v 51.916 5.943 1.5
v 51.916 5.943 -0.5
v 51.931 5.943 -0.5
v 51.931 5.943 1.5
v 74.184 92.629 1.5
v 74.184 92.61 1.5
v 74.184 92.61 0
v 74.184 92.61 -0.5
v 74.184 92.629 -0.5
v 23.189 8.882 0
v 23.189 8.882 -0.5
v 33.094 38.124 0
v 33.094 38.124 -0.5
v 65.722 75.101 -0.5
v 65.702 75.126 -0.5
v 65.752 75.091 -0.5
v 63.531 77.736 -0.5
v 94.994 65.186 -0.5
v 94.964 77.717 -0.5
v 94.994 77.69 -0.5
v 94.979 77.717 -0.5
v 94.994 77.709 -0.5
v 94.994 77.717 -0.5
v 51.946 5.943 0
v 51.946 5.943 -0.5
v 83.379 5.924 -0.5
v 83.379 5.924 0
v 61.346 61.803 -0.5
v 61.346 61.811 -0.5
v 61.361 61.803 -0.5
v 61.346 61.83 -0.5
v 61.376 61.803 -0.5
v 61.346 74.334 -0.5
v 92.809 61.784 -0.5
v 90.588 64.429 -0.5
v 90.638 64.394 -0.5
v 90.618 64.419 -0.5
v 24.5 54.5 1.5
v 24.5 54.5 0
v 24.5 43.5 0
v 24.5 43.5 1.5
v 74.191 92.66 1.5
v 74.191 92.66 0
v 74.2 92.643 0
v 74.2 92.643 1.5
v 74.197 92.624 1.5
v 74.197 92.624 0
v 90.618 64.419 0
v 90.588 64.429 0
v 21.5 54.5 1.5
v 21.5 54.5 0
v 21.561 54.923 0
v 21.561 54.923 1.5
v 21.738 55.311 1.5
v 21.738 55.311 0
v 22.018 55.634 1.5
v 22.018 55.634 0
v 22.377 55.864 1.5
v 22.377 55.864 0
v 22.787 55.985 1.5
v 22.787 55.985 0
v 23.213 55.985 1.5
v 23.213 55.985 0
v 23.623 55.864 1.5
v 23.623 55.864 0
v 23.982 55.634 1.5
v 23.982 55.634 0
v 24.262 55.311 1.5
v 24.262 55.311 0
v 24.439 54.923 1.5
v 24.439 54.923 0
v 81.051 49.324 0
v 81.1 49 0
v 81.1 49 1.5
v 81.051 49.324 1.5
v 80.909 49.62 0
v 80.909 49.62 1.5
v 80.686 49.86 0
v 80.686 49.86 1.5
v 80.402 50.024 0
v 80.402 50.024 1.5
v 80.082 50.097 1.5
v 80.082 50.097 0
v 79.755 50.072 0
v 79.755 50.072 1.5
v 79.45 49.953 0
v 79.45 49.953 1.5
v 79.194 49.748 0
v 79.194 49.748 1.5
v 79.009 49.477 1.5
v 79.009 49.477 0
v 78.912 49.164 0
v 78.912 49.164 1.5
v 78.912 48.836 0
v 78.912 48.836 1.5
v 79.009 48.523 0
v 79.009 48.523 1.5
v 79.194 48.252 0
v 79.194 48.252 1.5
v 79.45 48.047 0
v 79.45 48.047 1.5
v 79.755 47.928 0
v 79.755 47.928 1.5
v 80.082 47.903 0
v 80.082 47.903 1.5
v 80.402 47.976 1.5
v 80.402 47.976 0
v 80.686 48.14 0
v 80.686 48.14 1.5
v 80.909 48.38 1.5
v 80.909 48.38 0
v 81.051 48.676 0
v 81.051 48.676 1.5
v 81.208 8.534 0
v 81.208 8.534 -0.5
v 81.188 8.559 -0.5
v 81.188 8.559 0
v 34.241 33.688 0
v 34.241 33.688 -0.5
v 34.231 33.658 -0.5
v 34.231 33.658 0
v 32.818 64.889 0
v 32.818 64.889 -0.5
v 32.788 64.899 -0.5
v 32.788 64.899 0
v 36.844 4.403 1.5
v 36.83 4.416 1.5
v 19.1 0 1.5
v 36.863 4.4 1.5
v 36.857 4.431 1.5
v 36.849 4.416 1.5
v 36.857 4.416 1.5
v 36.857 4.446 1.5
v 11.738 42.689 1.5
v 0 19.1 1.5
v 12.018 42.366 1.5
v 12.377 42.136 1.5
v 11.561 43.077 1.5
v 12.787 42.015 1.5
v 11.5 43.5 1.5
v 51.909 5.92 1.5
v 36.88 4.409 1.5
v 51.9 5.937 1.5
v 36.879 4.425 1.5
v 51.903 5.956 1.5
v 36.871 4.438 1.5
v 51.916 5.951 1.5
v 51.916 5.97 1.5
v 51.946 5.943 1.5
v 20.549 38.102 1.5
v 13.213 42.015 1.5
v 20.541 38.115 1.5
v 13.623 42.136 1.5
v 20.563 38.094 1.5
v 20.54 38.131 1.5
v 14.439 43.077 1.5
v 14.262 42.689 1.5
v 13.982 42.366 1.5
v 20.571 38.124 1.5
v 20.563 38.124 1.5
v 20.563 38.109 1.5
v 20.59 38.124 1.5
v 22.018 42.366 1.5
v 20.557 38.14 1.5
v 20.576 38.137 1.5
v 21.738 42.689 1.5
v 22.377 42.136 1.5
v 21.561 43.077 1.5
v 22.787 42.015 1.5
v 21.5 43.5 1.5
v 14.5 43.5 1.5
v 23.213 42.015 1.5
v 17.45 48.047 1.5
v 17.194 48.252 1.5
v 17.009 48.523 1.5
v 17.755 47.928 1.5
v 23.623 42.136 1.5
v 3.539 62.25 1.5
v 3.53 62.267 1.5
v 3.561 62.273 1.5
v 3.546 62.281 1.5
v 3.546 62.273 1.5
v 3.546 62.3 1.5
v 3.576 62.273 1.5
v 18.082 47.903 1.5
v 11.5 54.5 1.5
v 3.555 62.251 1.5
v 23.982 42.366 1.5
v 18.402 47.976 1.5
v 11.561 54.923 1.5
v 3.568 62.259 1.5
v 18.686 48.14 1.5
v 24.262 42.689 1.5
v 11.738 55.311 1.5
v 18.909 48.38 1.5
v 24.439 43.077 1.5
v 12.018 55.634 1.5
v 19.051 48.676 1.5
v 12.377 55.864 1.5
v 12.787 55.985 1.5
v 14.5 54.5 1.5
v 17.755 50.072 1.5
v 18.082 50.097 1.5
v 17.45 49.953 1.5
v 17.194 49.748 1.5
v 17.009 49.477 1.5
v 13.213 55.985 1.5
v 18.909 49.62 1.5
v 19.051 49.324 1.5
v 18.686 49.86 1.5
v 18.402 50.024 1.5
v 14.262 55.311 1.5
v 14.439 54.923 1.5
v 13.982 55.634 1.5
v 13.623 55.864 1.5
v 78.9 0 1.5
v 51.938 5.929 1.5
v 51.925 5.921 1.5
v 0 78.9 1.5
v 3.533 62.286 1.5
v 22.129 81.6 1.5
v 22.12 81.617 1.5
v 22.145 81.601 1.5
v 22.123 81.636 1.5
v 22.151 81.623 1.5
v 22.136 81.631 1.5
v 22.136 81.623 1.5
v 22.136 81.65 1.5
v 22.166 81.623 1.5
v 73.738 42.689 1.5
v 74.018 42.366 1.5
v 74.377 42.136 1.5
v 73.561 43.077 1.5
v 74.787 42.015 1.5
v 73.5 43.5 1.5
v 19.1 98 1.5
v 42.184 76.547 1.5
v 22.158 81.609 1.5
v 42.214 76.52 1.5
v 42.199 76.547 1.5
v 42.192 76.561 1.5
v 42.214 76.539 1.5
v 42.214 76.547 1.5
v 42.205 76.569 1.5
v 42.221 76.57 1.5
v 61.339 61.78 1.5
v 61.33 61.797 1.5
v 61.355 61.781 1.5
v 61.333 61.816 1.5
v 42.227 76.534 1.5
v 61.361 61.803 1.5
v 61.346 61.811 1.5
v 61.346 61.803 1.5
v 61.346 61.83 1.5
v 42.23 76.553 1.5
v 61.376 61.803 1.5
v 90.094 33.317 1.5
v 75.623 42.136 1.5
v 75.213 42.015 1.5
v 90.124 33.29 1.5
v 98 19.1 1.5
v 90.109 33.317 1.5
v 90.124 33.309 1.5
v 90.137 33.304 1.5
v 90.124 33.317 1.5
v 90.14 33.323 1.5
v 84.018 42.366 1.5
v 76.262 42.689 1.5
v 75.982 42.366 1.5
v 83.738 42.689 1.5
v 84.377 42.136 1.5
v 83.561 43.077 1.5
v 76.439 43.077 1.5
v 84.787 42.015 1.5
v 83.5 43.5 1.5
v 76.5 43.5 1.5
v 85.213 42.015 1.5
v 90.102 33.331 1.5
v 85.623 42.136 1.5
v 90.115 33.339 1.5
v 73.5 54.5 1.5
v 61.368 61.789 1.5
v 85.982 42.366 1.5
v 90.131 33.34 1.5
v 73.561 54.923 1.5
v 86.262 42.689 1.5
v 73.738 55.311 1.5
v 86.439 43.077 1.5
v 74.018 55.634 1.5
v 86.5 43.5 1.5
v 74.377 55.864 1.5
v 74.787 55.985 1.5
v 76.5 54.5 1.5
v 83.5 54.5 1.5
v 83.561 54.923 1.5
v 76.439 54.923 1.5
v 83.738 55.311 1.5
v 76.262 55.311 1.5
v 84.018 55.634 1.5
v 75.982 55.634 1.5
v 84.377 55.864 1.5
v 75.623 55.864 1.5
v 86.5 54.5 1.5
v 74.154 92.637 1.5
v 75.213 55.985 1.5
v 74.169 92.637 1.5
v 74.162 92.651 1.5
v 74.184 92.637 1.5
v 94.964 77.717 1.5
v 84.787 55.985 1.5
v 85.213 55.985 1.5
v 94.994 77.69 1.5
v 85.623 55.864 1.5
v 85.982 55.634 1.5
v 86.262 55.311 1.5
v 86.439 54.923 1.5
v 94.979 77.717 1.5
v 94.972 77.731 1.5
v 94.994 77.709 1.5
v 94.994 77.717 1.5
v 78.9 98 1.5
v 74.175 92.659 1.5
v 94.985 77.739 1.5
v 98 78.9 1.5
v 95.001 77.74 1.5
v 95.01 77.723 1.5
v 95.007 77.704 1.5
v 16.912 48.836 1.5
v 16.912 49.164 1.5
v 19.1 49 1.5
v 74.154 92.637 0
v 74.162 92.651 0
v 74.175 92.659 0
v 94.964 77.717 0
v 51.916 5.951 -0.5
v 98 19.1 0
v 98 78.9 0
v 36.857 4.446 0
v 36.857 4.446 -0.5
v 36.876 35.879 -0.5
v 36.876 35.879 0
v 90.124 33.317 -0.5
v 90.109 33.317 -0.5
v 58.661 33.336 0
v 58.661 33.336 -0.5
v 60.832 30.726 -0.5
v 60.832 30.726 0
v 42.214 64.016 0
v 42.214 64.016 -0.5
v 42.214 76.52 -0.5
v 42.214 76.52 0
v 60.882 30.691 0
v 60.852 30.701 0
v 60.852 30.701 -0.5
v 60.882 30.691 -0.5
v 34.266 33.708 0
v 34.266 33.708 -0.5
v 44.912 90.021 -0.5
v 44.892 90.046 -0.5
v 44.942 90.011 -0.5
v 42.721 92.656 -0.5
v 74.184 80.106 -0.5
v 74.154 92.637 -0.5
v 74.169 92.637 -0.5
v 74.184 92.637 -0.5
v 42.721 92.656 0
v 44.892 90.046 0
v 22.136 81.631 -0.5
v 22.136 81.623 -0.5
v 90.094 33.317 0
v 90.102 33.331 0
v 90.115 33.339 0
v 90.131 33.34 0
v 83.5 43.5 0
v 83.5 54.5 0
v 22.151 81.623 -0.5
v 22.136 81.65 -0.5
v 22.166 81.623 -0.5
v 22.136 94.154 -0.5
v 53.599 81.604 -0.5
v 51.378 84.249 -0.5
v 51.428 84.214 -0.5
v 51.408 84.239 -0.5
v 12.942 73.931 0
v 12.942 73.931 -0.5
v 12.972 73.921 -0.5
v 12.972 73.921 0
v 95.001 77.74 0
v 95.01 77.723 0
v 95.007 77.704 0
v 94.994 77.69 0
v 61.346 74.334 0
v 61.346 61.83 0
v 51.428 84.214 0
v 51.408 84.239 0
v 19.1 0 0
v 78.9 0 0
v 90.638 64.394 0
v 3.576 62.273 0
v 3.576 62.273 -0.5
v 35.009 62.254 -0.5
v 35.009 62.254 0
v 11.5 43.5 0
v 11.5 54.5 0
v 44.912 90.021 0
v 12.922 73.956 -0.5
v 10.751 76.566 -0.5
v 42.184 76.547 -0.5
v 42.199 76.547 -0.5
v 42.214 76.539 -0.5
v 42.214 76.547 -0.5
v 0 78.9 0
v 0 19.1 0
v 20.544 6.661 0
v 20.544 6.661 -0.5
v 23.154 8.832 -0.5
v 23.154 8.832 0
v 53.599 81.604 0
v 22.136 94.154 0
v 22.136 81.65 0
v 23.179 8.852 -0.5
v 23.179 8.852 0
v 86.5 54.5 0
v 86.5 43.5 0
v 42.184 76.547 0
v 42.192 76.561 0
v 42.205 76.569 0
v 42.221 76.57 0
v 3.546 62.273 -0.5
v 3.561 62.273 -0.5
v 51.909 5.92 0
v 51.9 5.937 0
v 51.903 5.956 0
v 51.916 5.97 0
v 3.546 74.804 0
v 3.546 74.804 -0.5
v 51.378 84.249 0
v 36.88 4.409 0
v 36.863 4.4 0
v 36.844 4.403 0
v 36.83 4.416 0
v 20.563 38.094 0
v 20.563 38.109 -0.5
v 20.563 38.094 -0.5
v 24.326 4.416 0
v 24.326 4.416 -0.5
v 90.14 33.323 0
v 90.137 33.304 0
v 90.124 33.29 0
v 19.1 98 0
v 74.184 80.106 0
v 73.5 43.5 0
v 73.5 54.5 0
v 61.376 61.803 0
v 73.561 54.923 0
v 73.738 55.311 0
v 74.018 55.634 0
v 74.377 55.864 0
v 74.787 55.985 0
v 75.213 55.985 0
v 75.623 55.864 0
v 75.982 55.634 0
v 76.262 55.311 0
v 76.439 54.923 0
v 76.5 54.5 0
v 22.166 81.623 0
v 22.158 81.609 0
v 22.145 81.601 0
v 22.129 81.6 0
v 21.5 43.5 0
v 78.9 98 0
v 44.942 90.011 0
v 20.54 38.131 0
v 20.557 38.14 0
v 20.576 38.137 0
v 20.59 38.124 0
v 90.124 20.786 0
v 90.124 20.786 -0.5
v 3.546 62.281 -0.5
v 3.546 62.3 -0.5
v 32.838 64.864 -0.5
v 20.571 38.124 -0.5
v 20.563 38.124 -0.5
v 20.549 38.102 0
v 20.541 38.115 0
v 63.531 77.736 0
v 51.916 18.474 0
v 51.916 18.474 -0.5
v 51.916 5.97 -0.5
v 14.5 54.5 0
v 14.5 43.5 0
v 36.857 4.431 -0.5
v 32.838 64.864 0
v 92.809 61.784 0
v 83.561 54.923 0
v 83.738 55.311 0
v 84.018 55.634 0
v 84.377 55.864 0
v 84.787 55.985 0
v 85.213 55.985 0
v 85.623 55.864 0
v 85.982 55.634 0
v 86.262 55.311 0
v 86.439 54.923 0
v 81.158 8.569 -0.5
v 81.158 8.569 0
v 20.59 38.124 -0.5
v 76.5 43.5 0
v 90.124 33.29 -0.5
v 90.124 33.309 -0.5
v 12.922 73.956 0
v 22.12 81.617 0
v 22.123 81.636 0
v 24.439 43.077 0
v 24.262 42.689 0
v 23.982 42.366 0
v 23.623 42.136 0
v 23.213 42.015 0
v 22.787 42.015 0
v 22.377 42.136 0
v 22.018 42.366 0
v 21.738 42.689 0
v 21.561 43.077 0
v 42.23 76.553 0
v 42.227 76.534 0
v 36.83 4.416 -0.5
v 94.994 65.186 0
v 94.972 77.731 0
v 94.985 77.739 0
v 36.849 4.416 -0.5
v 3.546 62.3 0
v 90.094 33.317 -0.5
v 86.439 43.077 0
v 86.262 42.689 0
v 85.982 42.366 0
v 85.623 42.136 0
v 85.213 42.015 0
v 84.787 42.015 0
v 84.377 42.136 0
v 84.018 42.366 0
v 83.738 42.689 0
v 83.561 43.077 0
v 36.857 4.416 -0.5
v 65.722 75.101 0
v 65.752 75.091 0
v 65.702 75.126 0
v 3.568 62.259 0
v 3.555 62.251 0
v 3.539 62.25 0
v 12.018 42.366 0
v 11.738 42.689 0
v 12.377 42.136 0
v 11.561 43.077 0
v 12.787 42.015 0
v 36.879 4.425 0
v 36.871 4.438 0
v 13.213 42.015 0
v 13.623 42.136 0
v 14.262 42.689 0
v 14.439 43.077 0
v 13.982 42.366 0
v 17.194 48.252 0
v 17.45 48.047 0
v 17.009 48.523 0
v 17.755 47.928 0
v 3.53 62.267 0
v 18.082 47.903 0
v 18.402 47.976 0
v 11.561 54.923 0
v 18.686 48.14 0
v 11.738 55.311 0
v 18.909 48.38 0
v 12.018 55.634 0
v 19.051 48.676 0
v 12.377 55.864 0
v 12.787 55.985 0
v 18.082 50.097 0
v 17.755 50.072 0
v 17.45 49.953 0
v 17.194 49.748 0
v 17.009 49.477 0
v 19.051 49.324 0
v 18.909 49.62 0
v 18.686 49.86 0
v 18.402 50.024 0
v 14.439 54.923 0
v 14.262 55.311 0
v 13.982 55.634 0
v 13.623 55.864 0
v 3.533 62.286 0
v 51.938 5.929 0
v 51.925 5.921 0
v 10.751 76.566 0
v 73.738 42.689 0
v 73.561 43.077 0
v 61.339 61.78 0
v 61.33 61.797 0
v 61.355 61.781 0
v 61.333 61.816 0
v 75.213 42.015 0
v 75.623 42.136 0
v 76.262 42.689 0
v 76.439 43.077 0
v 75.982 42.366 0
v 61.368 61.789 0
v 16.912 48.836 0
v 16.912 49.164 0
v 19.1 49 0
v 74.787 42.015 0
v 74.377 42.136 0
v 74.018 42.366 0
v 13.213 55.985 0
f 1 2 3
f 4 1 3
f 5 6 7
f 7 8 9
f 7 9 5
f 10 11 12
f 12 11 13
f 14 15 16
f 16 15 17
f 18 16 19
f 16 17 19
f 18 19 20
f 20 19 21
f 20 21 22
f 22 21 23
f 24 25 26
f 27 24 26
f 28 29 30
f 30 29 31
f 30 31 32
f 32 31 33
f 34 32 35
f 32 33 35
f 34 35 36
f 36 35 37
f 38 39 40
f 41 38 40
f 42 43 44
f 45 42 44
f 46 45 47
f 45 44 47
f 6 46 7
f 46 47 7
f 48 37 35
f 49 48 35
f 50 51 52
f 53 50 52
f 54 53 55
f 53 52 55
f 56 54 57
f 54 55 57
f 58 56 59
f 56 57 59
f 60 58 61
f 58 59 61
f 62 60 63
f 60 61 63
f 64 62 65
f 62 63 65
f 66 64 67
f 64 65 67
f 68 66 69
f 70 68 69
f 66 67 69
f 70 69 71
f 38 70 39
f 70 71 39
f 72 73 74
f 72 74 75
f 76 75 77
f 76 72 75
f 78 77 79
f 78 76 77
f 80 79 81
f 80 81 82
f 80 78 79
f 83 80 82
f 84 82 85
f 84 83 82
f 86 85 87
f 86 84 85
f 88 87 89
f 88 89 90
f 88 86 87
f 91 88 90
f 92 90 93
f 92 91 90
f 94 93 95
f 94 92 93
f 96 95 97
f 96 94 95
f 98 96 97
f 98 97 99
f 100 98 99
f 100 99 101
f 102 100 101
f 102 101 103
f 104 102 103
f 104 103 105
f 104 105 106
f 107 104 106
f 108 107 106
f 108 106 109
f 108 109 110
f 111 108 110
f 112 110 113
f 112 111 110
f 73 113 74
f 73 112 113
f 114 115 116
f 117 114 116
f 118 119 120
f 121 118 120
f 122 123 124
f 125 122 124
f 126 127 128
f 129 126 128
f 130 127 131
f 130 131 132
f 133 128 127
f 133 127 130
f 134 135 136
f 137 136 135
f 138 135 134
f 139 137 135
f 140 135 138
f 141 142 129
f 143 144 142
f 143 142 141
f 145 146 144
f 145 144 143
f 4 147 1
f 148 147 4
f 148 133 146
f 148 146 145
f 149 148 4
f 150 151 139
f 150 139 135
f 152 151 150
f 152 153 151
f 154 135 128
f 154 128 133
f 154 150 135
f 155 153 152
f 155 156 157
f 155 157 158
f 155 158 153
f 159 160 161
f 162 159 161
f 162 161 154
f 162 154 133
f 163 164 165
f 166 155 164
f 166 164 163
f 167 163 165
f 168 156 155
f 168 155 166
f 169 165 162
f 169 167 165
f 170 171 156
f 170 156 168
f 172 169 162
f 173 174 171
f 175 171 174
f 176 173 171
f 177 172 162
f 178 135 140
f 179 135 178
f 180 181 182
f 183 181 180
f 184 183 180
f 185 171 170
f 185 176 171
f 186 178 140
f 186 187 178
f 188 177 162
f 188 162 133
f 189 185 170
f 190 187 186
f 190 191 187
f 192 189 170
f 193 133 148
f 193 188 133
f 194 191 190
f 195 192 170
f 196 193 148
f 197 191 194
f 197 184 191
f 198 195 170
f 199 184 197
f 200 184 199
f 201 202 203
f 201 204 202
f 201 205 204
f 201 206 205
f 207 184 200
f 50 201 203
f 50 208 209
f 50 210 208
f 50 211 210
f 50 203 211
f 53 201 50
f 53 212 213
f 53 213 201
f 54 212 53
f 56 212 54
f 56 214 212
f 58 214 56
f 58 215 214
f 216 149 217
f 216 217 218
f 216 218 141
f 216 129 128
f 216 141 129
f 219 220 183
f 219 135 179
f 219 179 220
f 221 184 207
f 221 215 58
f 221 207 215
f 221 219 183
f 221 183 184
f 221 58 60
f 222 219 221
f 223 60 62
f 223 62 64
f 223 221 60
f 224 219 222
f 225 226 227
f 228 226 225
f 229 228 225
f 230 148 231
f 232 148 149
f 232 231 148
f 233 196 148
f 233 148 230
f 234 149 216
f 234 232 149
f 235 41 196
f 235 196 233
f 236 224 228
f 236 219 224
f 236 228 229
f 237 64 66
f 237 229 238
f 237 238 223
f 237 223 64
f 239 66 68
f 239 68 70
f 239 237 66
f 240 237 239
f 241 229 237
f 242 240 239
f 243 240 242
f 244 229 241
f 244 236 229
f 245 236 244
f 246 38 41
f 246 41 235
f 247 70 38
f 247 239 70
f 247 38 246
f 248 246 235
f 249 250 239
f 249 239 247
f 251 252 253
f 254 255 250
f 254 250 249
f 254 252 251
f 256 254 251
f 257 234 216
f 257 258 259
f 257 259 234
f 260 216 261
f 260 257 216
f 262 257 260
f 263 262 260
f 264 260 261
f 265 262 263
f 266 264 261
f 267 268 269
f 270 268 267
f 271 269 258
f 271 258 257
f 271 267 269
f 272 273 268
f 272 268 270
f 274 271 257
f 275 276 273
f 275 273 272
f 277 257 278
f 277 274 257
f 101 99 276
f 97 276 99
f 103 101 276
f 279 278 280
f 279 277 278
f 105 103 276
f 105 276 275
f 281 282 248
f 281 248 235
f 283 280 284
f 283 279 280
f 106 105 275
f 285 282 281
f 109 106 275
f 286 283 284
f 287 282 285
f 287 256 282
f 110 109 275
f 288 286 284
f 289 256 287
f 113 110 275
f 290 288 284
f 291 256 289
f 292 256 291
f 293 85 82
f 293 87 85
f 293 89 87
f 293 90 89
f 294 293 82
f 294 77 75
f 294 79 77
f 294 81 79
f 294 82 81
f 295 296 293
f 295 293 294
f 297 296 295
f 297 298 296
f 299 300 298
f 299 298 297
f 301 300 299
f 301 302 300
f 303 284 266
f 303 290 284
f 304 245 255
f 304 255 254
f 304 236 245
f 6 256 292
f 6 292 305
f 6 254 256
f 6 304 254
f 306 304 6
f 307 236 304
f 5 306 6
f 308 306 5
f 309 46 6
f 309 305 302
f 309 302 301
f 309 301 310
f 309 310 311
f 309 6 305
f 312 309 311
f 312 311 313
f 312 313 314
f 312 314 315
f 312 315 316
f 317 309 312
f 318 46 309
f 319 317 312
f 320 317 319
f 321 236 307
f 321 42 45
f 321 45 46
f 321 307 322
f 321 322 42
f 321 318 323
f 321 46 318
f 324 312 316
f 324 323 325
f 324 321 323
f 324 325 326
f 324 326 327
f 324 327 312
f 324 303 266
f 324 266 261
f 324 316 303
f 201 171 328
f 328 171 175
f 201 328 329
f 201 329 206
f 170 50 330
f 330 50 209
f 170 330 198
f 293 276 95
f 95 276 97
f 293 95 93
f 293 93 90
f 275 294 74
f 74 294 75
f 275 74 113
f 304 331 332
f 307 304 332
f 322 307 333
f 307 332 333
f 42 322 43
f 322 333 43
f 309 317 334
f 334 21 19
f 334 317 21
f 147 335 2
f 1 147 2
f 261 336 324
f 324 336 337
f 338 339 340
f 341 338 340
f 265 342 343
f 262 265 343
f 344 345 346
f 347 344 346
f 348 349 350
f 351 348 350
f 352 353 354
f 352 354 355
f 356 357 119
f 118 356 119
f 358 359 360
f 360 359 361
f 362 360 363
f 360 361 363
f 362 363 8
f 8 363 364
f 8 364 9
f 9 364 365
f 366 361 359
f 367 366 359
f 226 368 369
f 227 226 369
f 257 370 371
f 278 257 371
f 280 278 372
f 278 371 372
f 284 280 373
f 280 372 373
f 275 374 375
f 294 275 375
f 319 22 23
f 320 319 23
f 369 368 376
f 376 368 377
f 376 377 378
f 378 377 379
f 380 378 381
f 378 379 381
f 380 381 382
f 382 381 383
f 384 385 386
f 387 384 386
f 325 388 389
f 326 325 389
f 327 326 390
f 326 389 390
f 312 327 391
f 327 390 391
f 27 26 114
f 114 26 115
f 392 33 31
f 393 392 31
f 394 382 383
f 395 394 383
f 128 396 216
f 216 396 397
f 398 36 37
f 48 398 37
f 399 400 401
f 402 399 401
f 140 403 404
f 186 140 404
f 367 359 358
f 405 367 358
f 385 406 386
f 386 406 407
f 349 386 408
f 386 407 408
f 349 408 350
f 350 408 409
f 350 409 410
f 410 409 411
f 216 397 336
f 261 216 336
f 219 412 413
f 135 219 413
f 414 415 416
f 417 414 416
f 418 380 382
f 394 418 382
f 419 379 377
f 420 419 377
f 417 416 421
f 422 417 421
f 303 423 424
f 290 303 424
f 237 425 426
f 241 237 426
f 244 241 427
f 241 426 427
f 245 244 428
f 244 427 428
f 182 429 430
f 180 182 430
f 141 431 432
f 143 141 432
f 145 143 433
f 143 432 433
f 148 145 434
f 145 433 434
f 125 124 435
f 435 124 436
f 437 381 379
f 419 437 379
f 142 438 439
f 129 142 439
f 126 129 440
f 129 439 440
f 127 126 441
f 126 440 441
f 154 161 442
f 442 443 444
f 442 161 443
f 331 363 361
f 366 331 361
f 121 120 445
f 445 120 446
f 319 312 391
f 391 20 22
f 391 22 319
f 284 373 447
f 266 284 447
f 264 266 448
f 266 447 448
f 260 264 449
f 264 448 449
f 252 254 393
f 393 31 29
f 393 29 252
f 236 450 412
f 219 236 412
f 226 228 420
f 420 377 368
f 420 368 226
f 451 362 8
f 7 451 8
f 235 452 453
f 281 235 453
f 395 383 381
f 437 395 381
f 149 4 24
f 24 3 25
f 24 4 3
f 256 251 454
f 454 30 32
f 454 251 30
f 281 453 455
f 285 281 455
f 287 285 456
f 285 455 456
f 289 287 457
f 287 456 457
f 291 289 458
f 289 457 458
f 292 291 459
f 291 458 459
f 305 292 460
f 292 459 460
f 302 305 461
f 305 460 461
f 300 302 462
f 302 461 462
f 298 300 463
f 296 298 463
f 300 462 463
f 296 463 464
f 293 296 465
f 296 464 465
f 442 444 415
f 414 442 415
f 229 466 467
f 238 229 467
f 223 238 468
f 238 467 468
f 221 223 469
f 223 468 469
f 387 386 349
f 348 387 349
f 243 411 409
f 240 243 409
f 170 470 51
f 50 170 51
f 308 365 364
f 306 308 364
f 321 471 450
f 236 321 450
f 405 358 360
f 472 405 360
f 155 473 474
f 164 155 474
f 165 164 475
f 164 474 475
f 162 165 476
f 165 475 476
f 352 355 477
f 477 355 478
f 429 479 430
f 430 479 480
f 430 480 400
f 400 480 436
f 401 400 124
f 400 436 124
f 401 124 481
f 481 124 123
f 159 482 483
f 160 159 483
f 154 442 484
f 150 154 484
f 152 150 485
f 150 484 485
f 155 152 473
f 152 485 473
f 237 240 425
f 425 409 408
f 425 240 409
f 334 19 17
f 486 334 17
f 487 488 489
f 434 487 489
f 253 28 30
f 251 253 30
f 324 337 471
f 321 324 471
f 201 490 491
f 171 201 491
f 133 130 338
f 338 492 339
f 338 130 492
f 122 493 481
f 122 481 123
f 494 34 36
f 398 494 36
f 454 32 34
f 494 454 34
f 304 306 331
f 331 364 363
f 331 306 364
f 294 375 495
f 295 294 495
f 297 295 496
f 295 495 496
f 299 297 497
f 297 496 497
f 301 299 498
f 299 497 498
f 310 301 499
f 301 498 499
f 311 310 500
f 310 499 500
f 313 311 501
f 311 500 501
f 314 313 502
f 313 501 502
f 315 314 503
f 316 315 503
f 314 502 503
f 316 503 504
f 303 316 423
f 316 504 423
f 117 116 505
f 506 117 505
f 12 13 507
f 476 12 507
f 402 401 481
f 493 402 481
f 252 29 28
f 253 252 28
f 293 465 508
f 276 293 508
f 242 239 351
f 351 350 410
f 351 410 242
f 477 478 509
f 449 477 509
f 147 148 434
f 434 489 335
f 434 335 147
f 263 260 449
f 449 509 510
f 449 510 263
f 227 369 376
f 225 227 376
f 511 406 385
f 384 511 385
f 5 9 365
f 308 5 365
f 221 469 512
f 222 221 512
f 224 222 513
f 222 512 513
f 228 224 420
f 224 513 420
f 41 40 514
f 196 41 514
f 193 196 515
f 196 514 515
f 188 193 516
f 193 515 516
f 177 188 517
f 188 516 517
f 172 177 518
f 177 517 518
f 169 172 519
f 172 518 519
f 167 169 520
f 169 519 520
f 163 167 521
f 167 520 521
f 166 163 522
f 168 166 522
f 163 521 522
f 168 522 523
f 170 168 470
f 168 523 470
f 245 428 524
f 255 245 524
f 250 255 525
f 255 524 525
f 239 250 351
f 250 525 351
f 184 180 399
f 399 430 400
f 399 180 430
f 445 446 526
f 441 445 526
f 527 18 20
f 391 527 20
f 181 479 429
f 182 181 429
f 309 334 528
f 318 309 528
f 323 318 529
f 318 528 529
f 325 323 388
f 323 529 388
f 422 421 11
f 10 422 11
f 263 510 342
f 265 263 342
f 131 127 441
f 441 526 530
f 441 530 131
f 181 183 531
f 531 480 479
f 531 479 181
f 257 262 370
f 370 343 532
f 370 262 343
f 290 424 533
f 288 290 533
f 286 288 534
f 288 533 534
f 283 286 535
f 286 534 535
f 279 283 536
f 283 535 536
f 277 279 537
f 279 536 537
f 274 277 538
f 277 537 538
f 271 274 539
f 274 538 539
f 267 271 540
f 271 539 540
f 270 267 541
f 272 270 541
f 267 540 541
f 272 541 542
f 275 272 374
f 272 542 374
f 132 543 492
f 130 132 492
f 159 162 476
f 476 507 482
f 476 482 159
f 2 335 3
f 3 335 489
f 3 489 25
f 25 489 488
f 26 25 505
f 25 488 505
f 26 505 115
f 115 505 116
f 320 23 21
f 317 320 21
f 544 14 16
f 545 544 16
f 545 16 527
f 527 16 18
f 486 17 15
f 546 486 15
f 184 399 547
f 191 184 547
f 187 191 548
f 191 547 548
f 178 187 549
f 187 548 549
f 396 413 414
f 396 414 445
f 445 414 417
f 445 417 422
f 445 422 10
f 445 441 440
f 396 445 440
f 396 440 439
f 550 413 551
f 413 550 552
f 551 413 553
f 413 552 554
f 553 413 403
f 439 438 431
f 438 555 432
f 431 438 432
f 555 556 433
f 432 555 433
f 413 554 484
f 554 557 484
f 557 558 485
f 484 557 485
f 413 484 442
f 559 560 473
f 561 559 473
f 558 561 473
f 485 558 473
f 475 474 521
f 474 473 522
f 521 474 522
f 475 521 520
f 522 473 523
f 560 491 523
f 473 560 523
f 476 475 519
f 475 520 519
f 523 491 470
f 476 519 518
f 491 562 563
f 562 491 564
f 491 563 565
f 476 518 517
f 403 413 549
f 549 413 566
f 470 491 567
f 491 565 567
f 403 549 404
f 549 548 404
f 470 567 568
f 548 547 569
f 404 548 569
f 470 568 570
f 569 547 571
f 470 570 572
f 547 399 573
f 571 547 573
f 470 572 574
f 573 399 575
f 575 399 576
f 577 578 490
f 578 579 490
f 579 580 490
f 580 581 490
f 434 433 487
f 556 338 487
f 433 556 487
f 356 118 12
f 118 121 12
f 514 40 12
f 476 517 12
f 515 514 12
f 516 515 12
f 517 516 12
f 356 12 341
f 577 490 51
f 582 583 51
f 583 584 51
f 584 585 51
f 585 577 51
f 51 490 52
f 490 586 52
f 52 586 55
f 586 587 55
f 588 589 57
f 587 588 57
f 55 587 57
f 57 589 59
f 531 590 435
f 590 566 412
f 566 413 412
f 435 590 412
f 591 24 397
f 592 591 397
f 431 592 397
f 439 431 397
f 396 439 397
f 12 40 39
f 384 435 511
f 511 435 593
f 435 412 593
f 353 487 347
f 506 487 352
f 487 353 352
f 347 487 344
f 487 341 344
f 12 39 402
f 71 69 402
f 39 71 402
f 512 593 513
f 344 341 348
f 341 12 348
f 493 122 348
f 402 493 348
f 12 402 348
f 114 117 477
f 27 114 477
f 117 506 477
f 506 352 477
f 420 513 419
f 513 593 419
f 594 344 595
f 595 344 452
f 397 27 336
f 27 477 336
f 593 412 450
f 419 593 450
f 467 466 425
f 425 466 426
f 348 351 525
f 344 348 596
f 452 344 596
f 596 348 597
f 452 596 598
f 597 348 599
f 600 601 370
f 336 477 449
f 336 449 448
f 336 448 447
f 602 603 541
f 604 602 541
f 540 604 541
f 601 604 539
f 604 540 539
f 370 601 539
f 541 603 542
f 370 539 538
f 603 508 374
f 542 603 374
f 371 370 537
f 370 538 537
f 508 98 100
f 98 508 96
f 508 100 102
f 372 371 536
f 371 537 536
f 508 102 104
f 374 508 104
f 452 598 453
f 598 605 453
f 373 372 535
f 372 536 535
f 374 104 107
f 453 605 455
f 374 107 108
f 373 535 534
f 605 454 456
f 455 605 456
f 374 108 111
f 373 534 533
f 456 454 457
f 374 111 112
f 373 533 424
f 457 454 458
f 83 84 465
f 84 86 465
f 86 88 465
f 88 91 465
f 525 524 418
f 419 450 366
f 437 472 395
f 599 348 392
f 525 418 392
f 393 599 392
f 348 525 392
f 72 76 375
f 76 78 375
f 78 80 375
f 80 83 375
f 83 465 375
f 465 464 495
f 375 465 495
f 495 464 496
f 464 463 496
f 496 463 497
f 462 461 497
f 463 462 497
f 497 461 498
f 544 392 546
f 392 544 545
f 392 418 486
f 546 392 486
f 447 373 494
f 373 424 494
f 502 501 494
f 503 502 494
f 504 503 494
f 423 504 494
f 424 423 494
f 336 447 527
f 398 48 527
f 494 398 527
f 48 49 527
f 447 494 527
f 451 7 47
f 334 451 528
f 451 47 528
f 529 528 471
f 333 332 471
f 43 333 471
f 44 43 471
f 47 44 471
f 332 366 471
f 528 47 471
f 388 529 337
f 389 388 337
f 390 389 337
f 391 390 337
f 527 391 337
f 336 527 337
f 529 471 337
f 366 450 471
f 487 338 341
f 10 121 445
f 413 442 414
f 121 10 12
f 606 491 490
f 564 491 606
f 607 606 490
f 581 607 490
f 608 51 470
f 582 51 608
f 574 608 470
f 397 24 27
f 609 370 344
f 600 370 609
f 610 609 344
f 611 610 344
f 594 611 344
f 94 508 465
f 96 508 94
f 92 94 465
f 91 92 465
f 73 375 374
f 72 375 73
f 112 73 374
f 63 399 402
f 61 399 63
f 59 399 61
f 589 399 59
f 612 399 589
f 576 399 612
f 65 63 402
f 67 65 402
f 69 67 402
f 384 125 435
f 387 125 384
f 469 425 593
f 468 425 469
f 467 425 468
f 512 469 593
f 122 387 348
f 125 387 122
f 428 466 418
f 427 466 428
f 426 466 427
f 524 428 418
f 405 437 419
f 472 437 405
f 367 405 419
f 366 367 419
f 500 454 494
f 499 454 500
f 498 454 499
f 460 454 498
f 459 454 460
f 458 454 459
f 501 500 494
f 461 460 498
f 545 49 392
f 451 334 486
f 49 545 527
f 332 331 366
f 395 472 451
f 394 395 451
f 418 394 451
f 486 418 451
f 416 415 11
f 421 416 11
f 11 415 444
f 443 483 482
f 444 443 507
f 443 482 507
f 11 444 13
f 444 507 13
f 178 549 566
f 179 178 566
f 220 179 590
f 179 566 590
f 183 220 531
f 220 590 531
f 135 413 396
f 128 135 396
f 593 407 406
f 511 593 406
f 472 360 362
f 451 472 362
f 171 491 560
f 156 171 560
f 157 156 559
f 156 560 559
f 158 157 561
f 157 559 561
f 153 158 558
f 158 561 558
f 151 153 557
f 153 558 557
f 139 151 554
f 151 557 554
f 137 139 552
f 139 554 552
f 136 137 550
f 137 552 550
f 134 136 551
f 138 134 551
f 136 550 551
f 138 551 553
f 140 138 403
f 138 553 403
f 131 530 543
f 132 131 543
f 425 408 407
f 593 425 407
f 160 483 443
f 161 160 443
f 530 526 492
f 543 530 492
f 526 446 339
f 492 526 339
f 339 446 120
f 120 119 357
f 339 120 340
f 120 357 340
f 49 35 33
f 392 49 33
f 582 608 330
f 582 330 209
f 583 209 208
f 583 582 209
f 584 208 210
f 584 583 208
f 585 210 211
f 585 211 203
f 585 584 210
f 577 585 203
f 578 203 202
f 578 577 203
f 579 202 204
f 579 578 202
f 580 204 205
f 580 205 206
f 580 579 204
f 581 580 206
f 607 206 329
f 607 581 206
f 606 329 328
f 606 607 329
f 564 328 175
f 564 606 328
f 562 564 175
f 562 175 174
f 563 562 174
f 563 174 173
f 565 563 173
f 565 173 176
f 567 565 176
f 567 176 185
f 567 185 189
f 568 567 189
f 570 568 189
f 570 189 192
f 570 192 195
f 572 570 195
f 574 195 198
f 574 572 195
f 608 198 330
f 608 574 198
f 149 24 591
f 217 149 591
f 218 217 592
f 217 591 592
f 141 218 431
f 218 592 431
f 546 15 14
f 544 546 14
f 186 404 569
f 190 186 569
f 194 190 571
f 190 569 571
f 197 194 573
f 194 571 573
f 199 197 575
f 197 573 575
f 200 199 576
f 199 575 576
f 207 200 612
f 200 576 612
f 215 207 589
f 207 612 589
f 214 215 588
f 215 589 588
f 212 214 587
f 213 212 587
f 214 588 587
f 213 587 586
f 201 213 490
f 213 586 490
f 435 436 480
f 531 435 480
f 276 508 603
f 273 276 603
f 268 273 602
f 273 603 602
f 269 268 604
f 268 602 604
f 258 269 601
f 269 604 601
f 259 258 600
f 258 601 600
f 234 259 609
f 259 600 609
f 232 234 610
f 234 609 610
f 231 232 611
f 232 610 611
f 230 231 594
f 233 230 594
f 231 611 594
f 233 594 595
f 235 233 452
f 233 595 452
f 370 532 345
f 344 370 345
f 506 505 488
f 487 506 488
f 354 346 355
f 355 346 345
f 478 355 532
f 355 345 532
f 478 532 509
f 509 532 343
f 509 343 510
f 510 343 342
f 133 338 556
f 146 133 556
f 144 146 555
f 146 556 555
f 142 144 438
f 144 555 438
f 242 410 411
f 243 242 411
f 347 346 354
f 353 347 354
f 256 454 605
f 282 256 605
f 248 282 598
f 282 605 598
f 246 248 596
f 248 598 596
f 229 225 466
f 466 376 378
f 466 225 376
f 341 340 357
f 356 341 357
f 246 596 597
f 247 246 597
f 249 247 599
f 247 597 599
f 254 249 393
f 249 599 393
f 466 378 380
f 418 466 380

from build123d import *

# Parameters (mm, degrees)
BOSS_EXTRUDE1_OUTLINE_R  = 1.1
BOSS_EXTRUDE1_DEPTH      = 1.5
BOSS_EXTRUDE2_DEPTH      = 1.5
BOSS_EXTRUDE2_DEPTH_BACK = 0.5


# Read off the part's stored shape, not the designer's step: Boss-Extrude1
with BuildPart() as part:
    # Boss-Extrude1 outline → Boss-Extrude1 (new body)
    with BuildSketch(Plane.XY):
        Polygon((19.1, 98), (0, 78.9), (0, 19.1), (19.1, 0), (78.9, 0), (98, 19.1), (98, 78.9), (78.9, 98), align=None)
        with BuildLine():
            Line((36.8757, 35.879), (36.857308756, 4.446264405))
            ThreePointArc((36.857308756, 4.446264405), (36.875994273, 4.43215571), (36.879898885, 4.409069831))
            ThreePointArc((36.879898885, 4.409069831), (36.853148575, 4.399873011), (36.829703907, 4.41570046))
            Line((36.829703907, 4.41570046), (24.3261, 4.416))
            Line((24.3261, 4.416), (34.2414, 33.6881))
            Line((34.2414, 33.6881), (36.8757, 35.879))
        make_face(mode=Mode.SUBTRACT)
        with BuildLine():
            Line((20.5443, 6.661), (20.562691244, 38.093735595))
            ThreePointArc((20.562691244, 38.093735595), (20.544005727, 38.10784429), (20.540101115, 38.130930169))
            ThreePointArc((20.540101115, 38.130930169), (20.566851425, 38.140126989), (20.590296093, 38.12429954))
            Line((20.590296093, 38.12429954), (33.0939, 38.124))
            Line((33.0939, 38.124), (23.1786, 8.8519))
            Line((23.1786, 8.8519), (20.5443, 6.661))
        make_face(mode=Mode.SUBTRACT)
        with BuildLine():
            Line((11.5, 43.5), (11.5, 54.5))
            ThreePointArc((11.5, 54.5), (13, 56), (14.5, 54.5))
            Line((14.5, 54.5), (14.5, 43.5))
            ThreePointArc((14.5, 43.5), (13, 42), (11.5, 43.5))
        make_face(mode=Mode.SUBTRACT)
        with Locations((18, 49)):
            Circle(BOSS_EXTRUDE1_OUTLINE_R, mode=Mode.SUBTRACT)
        with BuildLine():
            Line((21.5, 43.5), (21.5, 54.5))
            ThreePointArc((21.5, 54.5), (23, 56), (24.5, 54.5))
            Line((24.5, 54.5), (24.5, 43.5))
            ThreePointArc((24.5, 43.5), (23, 42), (21.5, 43.5))
        make_face(mode=Mode.SUBTRACT)
        with BuildLine():
            Line((83.379, 5.9243), (51.946264405, 5.942691244))
            ThreePointArc((51.946264405, 5.942691244), (51.93215571, 5.924005727), (51.909069831, 5.920101115))
            ThreePointArc((51.909069831, 5.920101115), (51.899873011, 5.946851425), (51.91570046, 5.970296093))
            Line((51.91570046, 5.970296093), (51.916, 18.4739))
            Line((51.916, 18.4739), (81.1881, 8.5586))
            Line((81.1881, 8.5586), (83.379, 5.9243))
        make_face(mode=Mode.SUBTRACT)
        with BuildLine():
            Line((58.661, 33.3357), (90.093735595, 33.317308756))
            ThreePointArc((90.093735595, 33.317308756), (90.10784429, 33.335994273), (90.130930169, 33.339898885))
            ThreePointArc((90.130930169, 33.339898885), (90.140126989, 33.313148575), (90.12429954, 33.289703907))
            Line((90.12429954, 33.289703907), (90.124, 20.7861))
            Line((90.124, 20.7861), (60.8519, 30.7014))
            Line((60.8519, 30.7014), (58.661, 33.3357))
        make_face(mode=Mode.SUBTRACT)
        with BuildLine():
            Line((73.5, 43.5), (73.5, 54.5))
            ThreePointArc((73.5, 54.5), (75, 56), (76.5, 54.5))
            Line((76.5, 54.5), (76.5, 43.5))
            ThreePointArc((76.5, 43.5), (75, 42), (73.5, 43.5))
        make_face(mode=Mode.SUBTRACT)
        with Locations((80, 49)):
            Circle(BOSS_EXTRUDE1_OUTLINE_R, mode=Mode.SUBTRACT)
        with BuildLine():
            Line((83.5, 43.5), (83.5, 54.5))
            ThreePointArc((83.5, 54.5), (85, 56), (86.5, 54.5))
            Line((86.5, 54.5), (86.5, 43.5))
            ThreePointArc((86.5, 43.5), (85, 42), (83.5, 43.5))
        make_face(mode=Mode.SUBTRACT)
        with BuildLine():
            Line((35.009, 62.2543), (3.576264405, 62.272691244))
            ThreePointArc((3.576264405, 62.272691244), (3.56215571, 62.254005727), (3.539069831, 62.250101115))
            ThreePointArc((3.539069831, 62.250101115), (3.529873011, 62.276851425), (3.54570046, 62.300296093))
            Line((3.54570046, 62.300296093), (3.546, 74.8039))
            Line((3.546, 74.8039), (32.8181, 64.8886))
            Line((32.8181, 64.8886), (35.009, 62.2543))
        make_face(mode=Mode.SUBTRACT)
        with BuildLine():
            Line((10.751, 76.5657), (42.183735595, 76.547308756))
            ThreePointArc((42.183735595, 76.547308756), (42.19784429, 76.565994273), (42.220930169, 76.569898885))
            ThreePointArc((42.220930169, 76.569898885), (42.230126989, 76.543148575), (42.21429954, 76.519703907))
            Line((42.21429954, 76.519703907), (42.214, 64.0161))
            Line((42.214, 64.0161), (12.9419, 73.9314))
            Line((12.9419, 73.9314), (10.751, 76.5657))
        make_face(mode=Mode.SUBTRACT)
        with BuildLine():
            Line((53.599, 81.6043), (22.166264405, 81.622691244))
            ThreePointArc((22.166264405, 81.622691244), (22.15215571, 81.604005727), (22.129069831, 81.600101115))
            ThreePointArc((22.129069831, 81.600101115), (22.119873011, 81.626851425), (22.13570046, 81.650296093))
            Line((22.13570046, 81.650296093), (22.136, 94.1539))
            Line((22.136, 94.1539), (51.4081, 84.2386))
            Line((51.4081, 84.2386), (53.599, 81.6043))
        make_face(mode=Mode.SUBTRACT)
        with BuildLine():
            Line((92.809, 61.7843), (61.376264405, 61.802691244))
            ThreePointArc((61.376264405, 61.802691244), (61.36215571, 61.784005727), (61.339069831, 61.780101115))
            ThreePointArc((61.339069831, 61.780101115), (61.329873011, 61.806851425), (61.34570046, 61.830296093))
            Line((61.34570046, 61.830296093), (61.346, 74.3339))
            Line((61.346, 74.3339), (90.6181, 64.4186))
            Line((90.6181, 64.4186), (92.809, 61.7843))
        make_face(mode=Mode.SUBTRACT)
        with BuildLine():
            Line((63.531, 77.7357), (94.963735595, 77.717308756))
            ThreePointArc((94.963735595, 77.717308756), (94.97784429, 77.735994273), (95.000930169, 77.739898885))
            ThreePointArc((95.000930169, 77.739898885), (95.010126989, 77.713148575), (94.99429954, 77.689703907))
            Line((94.99429954, 77.689703907), (94.994, 65.1861))
            Line((94.994, 65.1861), (65.7219, 75.1014))
            Line((65.7219, 75.1014), (63.531, 77.7357))
        make_face(mode=Mode.SUBTRACT)
        with BuildLine():
            Line((42.721, 92.6557), (74.153735595, 92.637308756))
            ThreePointArc((74.153735595, 92.637308756), (74.16784429, 92.655994273), (74.190930169, 92.659898885))
            ThreePointArc((74.190930169, 92.659898885), (74.200126989, 92.633148575), (74.18429954, 92.609703907))
            Line((74.18429954, 92.609703907), (74.184, 80.1061))
            Line((74.184, 80.1061), (44.9119, 90.0214))
            Line((44.9119, 90.0214), (42.721, 92.6557))
        make_face(mode=Mode.SUBTRACT)
    extrude(amount=BOSS_EXTRUDE1_DEPTH)

    # Model<4> → Boss-Extrude2 (add, two sides: drawn at the far end of the back side and taken through both)
    with BuildSketch(Plane.XY.offset(-BOSS_EXTRUDE2_DEPTH_BACK)):
        Polygon((42.2143, 76.5473), (42.1987, 76.5473), (42.183735595, 76.547308756), (10.751, 76.5657), (12.92157794, 73.955834891), (12.9419, 73.9314), (12.971962529, 73.921216959), (42.214, 64.0161), (42.21429954, 76.519703907), (42.2143, 76.5389), align=None)
        Polygon((3.54570046, 62.300296093), (3.5457, 62.2811), (3.5457, 62.2727), (3.5613, 62.2727), (3.576264405, 62.272691244), (35.009, 62.2543), (32.83842206, 64.864165109), (32.8181, 64.8886), (32.788037471, 64.898783041), (3.546, 74.8039), align=None)
        Polygon((22.13570046, 81.650296093), (22.1357, 81.6311), (22.1357, 81.623120089), (22.1513, 81.6227), (22.166264405, 81.622691244), (53.599, 81.6043), (51.42842206, 84.214165109), (51.4081, 84.2386), (51.378037471, 84.248783041), (22.136, 94.1539), align=None)
        Polygon((74.1843, 92.6373), (74.1687, 92.6373), (74.153735595, 92.637308756), (42.721, 92.6557), (44.89157794, 90.045834891), (44.9119, 90.0214), (44.941962529, 90.011216959), (74.184, 80.1061), (74.18429954, 92.609703907), (74.1843, 92.6289), align=None)
        Polygon((94.9943, 77.7173), (94.9787, 77.7173), (94.963735595, 77.717308756), (63.531, 77.7357), (65.70157794, 75.125834891), (65.7219, 75.1014), (65.751962529, 75.091216959), (94.994, 65.1861), (94.99429954, 77.689703907), (94.9943, 77.7089), align=None)
        Polygon((61.34570046, 61.830296093), (61.3457, 61.8111), (61.3457, 61.8027), (61.3613, 61.8027), (61.376264405, 61.802691244), (92.809, 61.7843), (90.63842206, 64.394165109), (90.6181, 64.4186), (90.588037471, 64.428783041), (61.346, 74.3339), align=None)
        Polygon((20.5627, 38.1243), (20.5627, 38.1087), (20.562691244, 38.093735595), (20.5443, 6.661), (23.154165109, 8.83157794), (23.1786, 8.8519), (23.188783041, 8.881962529), (33.0939, 38.124), (20.590296093, 38.12429954), (20.5711, 38.1243), align=None)
        Polygon((36.8573, 4.4157), (36.8573, 4.4313), (36.857308756, 4.446264405), (36.8757, 35.879), (34.265834891, 33.70842206), (34.2414, 33.6881), (34.231216959, 33.658037471), (24.3261, 4.416), (36.829703907, 4.41570046), (36.8489, 4.4157), align=None)
        Polygon((51.91570046, 5.970296093), (51.9157, 5.9511), (51.9157, 5.9427), (51.9313, 5.9427), (51.946264405, 5.942691244), (83.379, 5.9243), (81.20842206, 8.534165109), (81.1881, 8.5586), (81.158037471, 8.568783041), (51.916, 18.4739), align=None)
        Polygon((90.1243, 33.3173), (90.1087, 33.3173), (90.093735595, 33.317308756), (58.661, 33.3357), (60.83157794, 30.725834891), (60.8519, 30.7014), (60.881962529, 30.691216959), (90.124, 20.7861), (90.12429954, 33.289703907), (90.1243, 33.3089), align=None)
    extrude(amount=BOSS_EXTRUDE2_DEPTH + BOSS_EXTRUDE2_DEPTH_BACK)


solid = part.part
